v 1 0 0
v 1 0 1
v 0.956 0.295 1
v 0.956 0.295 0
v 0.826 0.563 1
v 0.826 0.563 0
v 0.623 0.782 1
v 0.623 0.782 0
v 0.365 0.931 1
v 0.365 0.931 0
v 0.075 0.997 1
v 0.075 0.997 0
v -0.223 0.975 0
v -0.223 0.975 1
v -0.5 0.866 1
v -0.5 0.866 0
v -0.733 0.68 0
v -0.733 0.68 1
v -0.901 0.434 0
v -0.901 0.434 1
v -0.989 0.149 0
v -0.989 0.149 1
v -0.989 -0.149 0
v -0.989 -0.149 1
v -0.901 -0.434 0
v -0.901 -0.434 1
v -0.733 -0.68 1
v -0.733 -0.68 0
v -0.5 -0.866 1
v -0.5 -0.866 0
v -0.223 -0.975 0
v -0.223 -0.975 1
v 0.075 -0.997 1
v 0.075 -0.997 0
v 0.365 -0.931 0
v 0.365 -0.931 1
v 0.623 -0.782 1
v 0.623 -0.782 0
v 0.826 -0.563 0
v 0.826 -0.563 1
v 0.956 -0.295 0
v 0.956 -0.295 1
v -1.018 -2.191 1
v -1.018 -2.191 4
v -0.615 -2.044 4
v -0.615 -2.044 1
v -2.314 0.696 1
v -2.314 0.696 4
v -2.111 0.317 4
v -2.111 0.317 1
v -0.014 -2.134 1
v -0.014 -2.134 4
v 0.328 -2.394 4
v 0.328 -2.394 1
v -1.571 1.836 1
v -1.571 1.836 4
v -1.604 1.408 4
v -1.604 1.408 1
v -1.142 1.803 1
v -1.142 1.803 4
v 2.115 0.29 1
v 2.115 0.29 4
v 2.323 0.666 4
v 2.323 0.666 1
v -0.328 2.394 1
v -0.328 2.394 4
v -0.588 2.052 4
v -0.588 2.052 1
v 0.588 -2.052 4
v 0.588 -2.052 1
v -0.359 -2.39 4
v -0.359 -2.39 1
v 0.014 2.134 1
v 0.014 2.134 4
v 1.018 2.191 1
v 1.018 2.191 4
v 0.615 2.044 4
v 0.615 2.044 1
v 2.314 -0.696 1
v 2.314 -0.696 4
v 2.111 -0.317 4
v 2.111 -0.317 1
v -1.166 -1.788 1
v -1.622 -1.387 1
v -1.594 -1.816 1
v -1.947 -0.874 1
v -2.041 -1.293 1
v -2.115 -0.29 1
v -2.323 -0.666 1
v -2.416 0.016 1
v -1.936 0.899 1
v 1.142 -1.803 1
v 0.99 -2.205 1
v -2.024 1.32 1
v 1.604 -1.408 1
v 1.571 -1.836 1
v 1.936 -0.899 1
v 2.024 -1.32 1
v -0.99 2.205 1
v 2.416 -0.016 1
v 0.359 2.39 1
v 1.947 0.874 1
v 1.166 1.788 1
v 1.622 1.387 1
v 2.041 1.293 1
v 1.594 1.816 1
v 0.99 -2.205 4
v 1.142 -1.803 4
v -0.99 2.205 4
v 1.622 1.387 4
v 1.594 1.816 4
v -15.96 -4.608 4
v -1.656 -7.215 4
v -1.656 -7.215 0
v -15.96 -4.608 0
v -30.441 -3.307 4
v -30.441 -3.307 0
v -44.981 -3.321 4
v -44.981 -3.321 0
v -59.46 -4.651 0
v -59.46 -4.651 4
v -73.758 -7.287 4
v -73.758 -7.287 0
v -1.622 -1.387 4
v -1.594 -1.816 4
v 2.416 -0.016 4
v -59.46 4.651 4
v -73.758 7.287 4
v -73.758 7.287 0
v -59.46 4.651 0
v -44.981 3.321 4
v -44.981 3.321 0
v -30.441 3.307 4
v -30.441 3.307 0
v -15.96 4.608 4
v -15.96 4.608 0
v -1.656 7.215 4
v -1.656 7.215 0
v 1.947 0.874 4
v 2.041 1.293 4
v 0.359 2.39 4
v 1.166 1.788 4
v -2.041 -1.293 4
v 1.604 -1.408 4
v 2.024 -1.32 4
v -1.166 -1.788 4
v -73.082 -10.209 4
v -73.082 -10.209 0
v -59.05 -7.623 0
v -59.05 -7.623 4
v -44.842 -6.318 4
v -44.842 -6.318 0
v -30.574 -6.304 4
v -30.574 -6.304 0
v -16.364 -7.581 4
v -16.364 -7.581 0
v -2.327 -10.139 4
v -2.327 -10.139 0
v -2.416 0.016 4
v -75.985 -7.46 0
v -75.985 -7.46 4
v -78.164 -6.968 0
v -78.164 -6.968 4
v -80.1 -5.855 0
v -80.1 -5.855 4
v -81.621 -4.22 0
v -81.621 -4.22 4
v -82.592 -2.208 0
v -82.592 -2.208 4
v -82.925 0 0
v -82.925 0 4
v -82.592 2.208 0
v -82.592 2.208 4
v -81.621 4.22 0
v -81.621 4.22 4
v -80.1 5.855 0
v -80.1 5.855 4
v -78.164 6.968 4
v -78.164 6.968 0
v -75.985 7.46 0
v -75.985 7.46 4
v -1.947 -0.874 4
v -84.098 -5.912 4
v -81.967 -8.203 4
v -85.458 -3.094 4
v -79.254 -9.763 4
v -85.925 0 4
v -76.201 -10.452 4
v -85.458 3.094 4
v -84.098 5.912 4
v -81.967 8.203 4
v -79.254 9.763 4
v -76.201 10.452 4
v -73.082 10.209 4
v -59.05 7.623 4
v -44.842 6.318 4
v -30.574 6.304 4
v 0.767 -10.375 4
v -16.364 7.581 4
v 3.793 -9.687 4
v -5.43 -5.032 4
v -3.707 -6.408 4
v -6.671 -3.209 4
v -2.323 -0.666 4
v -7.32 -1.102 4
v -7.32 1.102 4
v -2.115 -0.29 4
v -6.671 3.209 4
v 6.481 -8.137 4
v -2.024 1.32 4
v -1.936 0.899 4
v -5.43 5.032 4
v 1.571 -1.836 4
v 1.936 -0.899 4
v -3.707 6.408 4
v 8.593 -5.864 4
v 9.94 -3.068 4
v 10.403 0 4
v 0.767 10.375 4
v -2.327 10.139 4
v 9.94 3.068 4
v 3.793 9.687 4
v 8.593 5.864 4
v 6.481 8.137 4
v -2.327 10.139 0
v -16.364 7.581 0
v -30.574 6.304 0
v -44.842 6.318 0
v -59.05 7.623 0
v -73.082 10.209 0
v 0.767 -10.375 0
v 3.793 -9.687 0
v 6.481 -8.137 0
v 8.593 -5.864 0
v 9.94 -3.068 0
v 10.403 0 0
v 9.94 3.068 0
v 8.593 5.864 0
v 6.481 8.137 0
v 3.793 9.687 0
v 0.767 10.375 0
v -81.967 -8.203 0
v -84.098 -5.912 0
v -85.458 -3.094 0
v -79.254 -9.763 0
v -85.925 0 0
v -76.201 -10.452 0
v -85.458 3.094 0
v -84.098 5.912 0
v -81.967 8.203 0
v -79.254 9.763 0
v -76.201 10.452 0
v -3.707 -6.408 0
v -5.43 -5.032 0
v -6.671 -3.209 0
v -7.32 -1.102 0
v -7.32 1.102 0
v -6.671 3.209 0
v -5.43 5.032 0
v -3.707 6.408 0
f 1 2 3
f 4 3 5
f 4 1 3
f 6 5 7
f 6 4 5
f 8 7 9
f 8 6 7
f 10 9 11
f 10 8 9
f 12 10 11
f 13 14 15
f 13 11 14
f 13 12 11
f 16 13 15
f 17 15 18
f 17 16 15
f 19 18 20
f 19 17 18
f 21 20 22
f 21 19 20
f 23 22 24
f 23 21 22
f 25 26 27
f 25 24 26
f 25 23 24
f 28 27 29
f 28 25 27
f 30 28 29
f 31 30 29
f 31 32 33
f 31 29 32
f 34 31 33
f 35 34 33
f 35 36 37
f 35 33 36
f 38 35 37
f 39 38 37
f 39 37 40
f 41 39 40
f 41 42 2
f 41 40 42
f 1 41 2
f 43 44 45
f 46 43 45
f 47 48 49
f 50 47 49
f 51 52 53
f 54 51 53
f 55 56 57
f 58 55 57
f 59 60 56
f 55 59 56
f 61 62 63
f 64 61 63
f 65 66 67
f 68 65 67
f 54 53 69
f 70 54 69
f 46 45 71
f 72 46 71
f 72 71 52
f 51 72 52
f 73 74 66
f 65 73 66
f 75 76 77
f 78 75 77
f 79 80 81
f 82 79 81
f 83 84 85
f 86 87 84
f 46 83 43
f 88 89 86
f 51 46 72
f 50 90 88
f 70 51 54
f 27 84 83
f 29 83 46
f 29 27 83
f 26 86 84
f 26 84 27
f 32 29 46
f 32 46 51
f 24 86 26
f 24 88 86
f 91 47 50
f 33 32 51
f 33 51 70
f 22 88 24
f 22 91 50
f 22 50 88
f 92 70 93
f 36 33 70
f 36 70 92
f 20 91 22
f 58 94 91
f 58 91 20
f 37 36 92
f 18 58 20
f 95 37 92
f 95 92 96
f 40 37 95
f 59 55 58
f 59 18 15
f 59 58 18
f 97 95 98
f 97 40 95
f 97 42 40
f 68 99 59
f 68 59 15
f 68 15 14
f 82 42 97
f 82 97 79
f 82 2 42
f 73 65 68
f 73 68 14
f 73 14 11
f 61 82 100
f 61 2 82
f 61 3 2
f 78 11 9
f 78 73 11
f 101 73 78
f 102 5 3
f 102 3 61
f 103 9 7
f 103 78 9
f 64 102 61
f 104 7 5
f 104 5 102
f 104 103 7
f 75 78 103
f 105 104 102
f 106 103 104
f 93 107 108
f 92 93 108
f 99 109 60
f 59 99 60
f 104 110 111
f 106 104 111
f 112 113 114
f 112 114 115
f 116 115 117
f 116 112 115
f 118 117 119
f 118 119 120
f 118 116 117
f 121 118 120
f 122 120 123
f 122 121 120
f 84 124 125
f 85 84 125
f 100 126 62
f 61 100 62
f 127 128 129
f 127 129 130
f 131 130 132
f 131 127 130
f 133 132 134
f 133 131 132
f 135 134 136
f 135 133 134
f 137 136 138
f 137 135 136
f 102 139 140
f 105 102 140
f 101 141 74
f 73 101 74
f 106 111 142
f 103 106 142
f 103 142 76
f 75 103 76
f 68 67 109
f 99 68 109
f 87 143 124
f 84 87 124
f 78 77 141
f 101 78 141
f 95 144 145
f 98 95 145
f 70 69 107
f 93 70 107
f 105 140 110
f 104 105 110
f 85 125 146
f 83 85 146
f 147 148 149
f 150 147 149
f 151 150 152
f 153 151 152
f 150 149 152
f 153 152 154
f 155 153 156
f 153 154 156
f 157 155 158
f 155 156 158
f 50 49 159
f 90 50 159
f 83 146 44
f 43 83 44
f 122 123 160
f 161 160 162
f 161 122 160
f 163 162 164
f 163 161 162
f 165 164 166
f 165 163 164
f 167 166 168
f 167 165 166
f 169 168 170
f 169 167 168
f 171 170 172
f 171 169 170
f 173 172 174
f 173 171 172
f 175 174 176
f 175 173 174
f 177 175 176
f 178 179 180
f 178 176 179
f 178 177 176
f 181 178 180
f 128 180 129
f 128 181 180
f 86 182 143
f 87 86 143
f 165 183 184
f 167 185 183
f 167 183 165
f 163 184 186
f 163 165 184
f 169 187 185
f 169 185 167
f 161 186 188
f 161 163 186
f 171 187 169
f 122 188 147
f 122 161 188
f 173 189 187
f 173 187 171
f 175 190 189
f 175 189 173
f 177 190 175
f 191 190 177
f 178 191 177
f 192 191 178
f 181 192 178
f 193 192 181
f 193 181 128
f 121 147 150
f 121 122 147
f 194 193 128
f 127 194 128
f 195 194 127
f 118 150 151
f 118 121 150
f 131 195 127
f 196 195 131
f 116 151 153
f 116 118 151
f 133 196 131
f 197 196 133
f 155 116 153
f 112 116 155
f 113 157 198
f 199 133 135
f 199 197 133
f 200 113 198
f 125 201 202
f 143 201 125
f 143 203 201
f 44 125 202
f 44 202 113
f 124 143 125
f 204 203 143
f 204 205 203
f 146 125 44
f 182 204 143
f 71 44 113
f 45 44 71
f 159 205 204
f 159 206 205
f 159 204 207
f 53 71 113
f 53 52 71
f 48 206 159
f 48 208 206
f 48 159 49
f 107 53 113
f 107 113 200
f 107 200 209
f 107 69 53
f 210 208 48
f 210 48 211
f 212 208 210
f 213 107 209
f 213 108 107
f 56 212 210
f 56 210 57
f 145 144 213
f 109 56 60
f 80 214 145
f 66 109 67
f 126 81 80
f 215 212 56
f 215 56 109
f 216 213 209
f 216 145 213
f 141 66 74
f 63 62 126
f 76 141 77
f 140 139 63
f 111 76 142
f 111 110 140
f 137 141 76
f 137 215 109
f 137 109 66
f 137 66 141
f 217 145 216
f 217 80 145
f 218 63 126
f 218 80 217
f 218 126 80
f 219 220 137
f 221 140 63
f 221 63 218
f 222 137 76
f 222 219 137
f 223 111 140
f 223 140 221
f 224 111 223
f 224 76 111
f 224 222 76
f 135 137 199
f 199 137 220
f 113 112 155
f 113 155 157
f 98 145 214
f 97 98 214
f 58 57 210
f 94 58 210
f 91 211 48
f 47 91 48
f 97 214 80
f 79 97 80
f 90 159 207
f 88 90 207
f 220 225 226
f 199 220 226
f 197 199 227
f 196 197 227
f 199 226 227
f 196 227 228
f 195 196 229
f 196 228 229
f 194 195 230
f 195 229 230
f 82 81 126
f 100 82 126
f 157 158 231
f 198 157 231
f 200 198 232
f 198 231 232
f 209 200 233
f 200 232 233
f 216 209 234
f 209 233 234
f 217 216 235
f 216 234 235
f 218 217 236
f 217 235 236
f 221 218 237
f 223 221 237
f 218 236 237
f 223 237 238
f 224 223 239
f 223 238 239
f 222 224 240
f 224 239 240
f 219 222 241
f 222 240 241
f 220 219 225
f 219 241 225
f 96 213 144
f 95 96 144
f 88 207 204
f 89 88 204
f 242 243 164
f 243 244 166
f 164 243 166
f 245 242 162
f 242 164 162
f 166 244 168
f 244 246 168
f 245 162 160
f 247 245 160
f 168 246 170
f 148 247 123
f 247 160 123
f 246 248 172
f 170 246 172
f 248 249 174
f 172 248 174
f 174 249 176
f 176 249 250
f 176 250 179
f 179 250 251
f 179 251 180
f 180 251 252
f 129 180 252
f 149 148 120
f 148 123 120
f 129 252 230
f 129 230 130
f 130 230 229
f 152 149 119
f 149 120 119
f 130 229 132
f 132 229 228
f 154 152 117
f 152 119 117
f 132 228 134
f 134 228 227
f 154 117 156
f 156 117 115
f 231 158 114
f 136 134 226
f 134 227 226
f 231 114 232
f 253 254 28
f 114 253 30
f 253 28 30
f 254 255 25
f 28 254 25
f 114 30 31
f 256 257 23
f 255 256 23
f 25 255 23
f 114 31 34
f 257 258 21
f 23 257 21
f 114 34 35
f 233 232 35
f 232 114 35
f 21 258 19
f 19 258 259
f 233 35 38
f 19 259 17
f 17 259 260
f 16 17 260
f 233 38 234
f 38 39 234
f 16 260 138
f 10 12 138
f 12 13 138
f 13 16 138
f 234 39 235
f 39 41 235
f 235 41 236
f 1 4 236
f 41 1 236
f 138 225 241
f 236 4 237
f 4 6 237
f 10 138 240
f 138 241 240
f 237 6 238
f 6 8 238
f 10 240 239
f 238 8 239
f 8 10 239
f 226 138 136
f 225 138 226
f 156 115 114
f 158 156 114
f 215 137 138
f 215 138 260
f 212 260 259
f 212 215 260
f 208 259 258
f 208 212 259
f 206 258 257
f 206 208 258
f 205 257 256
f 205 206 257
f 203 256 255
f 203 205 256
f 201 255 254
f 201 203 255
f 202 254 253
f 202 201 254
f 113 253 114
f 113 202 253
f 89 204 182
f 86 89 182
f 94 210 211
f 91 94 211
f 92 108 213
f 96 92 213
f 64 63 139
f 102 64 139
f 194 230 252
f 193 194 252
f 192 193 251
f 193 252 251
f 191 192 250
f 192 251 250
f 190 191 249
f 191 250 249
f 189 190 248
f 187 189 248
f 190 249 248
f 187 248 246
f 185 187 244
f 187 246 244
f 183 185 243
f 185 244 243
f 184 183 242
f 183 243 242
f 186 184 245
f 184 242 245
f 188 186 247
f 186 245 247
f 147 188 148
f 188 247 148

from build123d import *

# Parameters (mm, degrees)
SKIZZE1_R                       = 1
AUFSATZ_LINEAR_AUSTRAGEN1_DEPTH = 4
SCHNITT_LINEAR_AUSTRAGEN1_DEPTH = 6
SCHNITT_LINEAR_AUSTRAGEN2_DEPTH = 3


with BuildPart() as part:
    # Skizze1 → Aufsatz-Linear austragen1 (new body)
    with BuildSketch(Plane.XY):
        with BuildLine():
            ThreePointArc((-73.08156136, 10.209205546), (-85.925298124, 0), (-73.08156136, -10.209205546))
            ThreePointArc((-73.08156136, -10.209205546), (-37.708269243, -6.148967962), (-2.327018144, -10.139255556))
            ThreePointArc((-2.327018144, -10.139255556), (10.402860985, 0), (-2.327018144, 10.139255556))
            ThreePointArc((-2.327018144, 10.139255556), (-37.708269243, 6.148967962), (-73.08156136, 10.209205546))
        make_face()
        Circle(SKIZZE1_R, mode=Mode.SUBTRACT)
    extrude(amount=AUFSATZ_LINEAR_AUSTRAGEN1_DEPTH)

    # Skizze2 → Schnitt-Linear austragen1 (cut)
    with BuildSketch(Plane.XY.offset(4)):
        with BuildLine():
            ThreePointArc((-1.655947518, 7.215274671), (-7.402860985, 0), (-1.655947518, -7.215274671))
            ThreePointArc((-1.655947518, -7.215274671), (-37.711235128, -3.148969428), (-73.758412133, -7.286557255))
            ThreePointArc((-73.758412133, -7.286557255), (-82.925298124, 0), (-73.758412133, 7.286557255))
            ThreePointArc((-73.758412133, 7.286557255), (-37.711235128, 3.148969428), (-1.655947518, 7.215274671))
        make_face()
    extrude(amount=-SCHNITT_LINEAR_AUSTRAGEN1_DEPTH, mode=Mode.SUBTRACT)

    # Skizze6 → Schnitt-Linear austragen2 (cut)
    with BuildSketch(Plane.XY.offset(4)):
        Polygon((1.165582934, 1.788027089), (1.018080563, 2.19148446), (0.614623192, 2.043982089), (0.359428626, 2.389540381), (0.013870334, 2.134345816), (-0.32834208, 2.394009952), (-0.588006216, 2.051797538), (-0.989512463, 2.204531074), (-1.142245999, 1.803024827), (-1.570518432, 1.836454199), (-1.603947805, 1.408181766), (-2.024290337, 1.319598727), (-1.935707298, 0.899256194), (-2.314066279, 0.695837214), (-2.110647298, 0.317478234), (-2.416370332, 0.015703108), (-2.114595207, -0.290019926), (-2.322914432, -0.66570317), (-1.947231188, -0.874022395), (-2.04126982, -1.293178136), (-1.622114079, -1.387216768), (-1.594253667, -1.815887501), (-1.165582934, -1.788027089), (-1.018080563, -2.19148446), (-0.614623192, -2.043982089), (-0.359428626, -2.389540381), (-0.013870334, -2.134345816), (0.32834208, -2.394009952), (0.588006216, -2.051797538), (0.989512463, -2.204531074), (1.142245999, -1.803024827), (1.570518432, -1.836454199), (1.603947805, -1.408181766), (2.024290337, -1.319598727), (1.935707298, -0.899256194), (2.314066279, -0.695837214), (2.110647298, -0.317478234), (2.416370332, -0.015703108), (2.114595207, 0.290019926), (2.322914432, 0.66570317), (1.947231188, 0.874022395), (2.04126982, 1.293178136), (1.622114079, 1.387216768), (1.594253667, 1.815887501), align=None)
    extrude(amount=-SCHNITT_LINEAR_AUSTRAGEN2_DEPTH, mode=Mode.SUBTRACT)


solid = part.part
